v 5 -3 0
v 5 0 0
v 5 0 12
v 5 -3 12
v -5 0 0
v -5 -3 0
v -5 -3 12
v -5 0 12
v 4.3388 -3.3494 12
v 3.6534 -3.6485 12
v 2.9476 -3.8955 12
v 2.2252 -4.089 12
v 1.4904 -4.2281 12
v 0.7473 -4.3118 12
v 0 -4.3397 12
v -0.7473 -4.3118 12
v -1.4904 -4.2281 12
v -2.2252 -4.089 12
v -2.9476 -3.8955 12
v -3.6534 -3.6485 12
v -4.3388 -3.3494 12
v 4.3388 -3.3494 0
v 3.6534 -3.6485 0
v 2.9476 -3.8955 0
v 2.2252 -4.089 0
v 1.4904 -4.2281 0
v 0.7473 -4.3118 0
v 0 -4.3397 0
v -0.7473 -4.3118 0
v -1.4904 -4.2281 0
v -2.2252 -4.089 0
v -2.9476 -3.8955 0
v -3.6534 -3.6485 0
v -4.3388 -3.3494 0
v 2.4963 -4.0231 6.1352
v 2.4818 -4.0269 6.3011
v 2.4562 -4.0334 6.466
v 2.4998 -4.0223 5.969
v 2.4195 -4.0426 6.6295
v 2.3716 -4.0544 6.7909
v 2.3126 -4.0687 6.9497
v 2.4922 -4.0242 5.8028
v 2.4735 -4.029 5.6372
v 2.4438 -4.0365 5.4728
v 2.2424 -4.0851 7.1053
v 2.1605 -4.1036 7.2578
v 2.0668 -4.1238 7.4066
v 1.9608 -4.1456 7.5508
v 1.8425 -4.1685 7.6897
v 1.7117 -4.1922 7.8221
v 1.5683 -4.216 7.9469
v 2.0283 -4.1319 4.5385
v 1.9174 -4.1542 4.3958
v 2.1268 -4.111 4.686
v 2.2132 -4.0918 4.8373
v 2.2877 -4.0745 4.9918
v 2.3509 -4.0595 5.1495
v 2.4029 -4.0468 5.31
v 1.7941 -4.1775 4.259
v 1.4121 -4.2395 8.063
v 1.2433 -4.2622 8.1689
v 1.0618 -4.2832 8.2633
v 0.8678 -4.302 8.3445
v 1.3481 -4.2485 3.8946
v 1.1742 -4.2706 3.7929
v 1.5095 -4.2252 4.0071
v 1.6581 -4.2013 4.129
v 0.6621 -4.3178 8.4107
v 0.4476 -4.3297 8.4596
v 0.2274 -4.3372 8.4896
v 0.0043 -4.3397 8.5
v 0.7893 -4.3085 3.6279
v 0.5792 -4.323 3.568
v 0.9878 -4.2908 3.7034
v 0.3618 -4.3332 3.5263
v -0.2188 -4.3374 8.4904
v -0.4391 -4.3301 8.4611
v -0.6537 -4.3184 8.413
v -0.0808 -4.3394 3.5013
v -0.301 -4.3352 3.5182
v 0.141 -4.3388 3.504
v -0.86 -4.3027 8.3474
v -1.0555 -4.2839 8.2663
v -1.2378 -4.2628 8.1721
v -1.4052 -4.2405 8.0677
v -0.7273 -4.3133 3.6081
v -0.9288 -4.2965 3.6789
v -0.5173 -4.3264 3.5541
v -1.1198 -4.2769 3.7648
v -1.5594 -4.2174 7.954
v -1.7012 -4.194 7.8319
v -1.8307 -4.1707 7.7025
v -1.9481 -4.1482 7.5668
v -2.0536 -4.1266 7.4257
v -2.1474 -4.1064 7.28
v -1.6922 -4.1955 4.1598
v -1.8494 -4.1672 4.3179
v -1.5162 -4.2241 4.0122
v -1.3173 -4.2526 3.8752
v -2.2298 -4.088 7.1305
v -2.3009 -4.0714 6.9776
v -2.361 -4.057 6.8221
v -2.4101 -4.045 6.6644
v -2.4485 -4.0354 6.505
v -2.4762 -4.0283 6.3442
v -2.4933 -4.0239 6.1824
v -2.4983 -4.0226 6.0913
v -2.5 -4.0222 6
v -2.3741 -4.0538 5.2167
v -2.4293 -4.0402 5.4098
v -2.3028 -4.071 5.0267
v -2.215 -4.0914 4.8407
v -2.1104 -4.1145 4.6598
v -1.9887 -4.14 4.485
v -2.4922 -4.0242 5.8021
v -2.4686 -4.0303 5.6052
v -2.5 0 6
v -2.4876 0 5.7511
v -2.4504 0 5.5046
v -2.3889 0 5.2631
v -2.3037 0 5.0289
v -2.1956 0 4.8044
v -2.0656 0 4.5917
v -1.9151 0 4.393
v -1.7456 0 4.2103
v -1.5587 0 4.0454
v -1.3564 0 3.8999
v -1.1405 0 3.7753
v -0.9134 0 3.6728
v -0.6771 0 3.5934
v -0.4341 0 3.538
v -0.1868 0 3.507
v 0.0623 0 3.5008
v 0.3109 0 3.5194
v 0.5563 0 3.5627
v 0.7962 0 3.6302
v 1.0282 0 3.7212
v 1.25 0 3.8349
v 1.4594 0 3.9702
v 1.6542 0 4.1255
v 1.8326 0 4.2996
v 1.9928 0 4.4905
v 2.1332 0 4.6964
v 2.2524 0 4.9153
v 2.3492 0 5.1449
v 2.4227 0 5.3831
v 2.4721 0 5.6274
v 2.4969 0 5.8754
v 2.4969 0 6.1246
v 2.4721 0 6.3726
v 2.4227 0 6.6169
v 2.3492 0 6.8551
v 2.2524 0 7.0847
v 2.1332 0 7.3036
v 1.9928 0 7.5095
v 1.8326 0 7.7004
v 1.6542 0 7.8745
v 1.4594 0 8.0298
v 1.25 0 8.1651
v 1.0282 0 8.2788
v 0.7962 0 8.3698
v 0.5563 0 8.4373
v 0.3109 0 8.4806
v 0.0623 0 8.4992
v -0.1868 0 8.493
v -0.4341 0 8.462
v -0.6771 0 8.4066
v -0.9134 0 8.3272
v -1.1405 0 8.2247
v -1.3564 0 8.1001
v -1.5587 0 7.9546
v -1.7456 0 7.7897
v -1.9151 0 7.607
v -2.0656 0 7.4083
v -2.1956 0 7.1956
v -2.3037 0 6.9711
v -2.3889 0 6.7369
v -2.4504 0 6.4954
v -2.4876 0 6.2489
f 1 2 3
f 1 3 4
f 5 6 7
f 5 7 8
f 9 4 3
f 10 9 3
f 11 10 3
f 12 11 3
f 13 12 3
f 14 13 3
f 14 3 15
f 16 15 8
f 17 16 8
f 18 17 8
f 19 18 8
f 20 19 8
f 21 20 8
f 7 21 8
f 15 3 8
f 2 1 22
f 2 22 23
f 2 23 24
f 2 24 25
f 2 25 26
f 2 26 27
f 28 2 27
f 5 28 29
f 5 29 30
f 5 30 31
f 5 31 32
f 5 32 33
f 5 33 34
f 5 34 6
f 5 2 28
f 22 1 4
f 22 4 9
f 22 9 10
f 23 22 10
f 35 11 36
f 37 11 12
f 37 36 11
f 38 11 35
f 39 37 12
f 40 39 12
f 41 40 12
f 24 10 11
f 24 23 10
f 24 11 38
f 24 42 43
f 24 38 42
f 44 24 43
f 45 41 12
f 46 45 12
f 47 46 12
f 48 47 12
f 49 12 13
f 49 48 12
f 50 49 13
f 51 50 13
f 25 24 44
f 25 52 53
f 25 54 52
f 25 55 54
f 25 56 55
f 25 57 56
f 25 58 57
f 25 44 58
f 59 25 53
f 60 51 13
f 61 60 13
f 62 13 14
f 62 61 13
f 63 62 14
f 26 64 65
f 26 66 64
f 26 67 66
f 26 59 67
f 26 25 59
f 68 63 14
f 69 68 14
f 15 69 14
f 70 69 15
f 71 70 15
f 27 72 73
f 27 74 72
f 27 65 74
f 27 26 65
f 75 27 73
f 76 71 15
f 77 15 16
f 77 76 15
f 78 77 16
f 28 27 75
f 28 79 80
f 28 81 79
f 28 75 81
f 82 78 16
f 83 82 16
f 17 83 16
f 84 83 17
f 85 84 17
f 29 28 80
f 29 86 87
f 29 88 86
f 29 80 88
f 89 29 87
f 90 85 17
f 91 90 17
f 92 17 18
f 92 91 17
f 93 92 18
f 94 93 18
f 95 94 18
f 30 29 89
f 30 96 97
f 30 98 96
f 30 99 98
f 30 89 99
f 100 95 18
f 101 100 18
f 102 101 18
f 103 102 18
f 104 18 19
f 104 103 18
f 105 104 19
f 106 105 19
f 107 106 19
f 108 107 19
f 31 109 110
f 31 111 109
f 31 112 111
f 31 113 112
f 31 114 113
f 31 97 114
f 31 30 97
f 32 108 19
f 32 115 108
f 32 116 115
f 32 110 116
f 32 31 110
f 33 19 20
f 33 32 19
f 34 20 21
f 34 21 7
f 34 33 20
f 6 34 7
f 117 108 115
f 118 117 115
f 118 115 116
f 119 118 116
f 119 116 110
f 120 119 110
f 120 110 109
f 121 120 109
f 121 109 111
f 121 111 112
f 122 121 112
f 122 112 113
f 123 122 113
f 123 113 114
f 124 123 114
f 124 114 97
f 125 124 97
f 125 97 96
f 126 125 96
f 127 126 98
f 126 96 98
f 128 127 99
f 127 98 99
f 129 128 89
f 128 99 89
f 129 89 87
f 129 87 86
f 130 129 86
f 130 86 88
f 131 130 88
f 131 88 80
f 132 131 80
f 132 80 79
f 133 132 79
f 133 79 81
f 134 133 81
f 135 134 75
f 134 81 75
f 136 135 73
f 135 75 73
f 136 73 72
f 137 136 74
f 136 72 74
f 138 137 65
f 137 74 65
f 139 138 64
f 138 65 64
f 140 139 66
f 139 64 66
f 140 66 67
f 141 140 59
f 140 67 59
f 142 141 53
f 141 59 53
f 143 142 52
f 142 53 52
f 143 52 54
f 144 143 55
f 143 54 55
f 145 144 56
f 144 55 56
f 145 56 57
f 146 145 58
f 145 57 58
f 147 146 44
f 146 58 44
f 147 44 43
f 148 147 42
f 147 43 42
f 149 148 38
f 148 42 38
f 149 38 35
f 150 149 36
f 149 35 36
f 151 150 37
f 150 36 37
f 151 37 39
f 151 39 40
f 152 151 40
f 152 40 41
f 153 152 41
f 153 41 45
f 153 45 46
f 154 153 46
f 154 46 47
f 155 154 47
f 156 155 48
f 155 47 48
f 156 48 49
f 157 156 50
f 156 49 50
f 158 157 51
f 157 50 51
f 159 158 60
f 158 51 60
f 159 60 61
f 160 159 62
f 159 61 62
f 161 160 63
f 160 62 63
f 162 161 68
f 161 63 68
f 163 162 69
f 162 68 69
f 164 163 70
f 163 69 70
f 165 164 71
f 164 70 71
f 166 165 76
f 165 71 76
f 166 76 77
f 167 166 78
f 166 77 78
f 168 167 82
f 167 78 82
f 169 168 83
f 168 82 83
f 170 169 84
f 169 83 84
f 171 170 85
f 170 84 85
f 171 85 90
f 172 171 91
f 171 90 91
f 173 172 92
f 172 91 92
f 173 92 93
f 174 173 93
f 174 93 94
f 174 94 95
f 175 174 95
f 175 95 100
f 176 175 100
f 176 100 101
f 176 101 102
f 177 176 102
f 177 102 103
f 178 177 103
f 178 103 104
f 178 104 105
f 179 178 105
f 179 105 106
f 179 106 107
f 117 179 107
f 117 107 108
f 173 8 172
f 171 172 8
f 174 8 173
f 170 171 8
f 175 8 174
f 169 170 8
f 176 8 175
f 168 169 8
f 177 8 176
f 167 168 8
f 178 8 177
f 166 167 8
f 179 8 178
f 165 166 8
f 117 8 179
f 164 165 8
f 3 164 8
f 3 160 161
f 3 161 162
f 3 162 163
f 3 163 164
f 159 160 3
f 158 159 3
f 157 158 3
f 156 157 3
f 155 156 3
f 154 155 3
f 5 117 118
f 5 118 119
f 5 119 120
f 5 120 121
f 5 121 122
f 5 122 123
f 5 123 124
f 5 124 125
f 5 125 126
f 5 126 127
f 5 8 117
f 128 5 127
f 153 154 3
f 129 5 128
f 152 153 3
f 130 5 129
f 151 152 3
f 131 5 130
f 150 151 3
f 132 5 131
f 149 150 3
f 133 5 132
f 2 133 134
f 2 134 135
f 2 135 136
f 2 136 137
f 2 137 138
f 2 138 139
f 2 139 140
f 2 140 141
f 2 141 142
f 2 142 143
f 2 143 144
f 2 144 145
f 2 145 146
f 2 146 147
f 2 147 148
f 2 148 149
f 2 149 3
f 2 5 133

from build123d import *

# Parameters (mm, degrees)
EXTRUDE_1_DEPTH = 12
M6X1_0_1_D      = 5
M6X1_0_1_DEPTH  = 15
M6X1_0_1_TIP    = 1.502151548


with BuildPart() as part:
    # 草圖1 → 填料-伸長1 (new body)
    with BuildSketch(Plane.XY):
        with BuildLine():
            Line((-5, 0), (5, 0))
            Line((5, 0), (5, -3))
            ThreePointArc((5, -3), (0, -4.339745962), (-5, -3))
            Line((-5, -3), (-5, 0))
        make_face()
    extrude(amount=EXTRUDE_1_DEPTH)

    # M6x1.0 螺紋孔1
    with Locations(Plane(origin=(0, 0, 0), x_dir=(1, 0, 0), z_dir=(0, 1, 0))):
        with Locations((0, -6)):
            Hole(M6X1_0_1_D / 2, depth=M6X1_0_1_DEPTH)
            with Locations((0, 0, -(M6X1_0_1_DEPTH + M6X1_0_1_TIP / 2))):  # 118° drill point
                Cone(0, M6X1_0_1_D / 2, M6X1_0_1_TIP, mode=Mode.SUBTRACT)


solid = part.part
